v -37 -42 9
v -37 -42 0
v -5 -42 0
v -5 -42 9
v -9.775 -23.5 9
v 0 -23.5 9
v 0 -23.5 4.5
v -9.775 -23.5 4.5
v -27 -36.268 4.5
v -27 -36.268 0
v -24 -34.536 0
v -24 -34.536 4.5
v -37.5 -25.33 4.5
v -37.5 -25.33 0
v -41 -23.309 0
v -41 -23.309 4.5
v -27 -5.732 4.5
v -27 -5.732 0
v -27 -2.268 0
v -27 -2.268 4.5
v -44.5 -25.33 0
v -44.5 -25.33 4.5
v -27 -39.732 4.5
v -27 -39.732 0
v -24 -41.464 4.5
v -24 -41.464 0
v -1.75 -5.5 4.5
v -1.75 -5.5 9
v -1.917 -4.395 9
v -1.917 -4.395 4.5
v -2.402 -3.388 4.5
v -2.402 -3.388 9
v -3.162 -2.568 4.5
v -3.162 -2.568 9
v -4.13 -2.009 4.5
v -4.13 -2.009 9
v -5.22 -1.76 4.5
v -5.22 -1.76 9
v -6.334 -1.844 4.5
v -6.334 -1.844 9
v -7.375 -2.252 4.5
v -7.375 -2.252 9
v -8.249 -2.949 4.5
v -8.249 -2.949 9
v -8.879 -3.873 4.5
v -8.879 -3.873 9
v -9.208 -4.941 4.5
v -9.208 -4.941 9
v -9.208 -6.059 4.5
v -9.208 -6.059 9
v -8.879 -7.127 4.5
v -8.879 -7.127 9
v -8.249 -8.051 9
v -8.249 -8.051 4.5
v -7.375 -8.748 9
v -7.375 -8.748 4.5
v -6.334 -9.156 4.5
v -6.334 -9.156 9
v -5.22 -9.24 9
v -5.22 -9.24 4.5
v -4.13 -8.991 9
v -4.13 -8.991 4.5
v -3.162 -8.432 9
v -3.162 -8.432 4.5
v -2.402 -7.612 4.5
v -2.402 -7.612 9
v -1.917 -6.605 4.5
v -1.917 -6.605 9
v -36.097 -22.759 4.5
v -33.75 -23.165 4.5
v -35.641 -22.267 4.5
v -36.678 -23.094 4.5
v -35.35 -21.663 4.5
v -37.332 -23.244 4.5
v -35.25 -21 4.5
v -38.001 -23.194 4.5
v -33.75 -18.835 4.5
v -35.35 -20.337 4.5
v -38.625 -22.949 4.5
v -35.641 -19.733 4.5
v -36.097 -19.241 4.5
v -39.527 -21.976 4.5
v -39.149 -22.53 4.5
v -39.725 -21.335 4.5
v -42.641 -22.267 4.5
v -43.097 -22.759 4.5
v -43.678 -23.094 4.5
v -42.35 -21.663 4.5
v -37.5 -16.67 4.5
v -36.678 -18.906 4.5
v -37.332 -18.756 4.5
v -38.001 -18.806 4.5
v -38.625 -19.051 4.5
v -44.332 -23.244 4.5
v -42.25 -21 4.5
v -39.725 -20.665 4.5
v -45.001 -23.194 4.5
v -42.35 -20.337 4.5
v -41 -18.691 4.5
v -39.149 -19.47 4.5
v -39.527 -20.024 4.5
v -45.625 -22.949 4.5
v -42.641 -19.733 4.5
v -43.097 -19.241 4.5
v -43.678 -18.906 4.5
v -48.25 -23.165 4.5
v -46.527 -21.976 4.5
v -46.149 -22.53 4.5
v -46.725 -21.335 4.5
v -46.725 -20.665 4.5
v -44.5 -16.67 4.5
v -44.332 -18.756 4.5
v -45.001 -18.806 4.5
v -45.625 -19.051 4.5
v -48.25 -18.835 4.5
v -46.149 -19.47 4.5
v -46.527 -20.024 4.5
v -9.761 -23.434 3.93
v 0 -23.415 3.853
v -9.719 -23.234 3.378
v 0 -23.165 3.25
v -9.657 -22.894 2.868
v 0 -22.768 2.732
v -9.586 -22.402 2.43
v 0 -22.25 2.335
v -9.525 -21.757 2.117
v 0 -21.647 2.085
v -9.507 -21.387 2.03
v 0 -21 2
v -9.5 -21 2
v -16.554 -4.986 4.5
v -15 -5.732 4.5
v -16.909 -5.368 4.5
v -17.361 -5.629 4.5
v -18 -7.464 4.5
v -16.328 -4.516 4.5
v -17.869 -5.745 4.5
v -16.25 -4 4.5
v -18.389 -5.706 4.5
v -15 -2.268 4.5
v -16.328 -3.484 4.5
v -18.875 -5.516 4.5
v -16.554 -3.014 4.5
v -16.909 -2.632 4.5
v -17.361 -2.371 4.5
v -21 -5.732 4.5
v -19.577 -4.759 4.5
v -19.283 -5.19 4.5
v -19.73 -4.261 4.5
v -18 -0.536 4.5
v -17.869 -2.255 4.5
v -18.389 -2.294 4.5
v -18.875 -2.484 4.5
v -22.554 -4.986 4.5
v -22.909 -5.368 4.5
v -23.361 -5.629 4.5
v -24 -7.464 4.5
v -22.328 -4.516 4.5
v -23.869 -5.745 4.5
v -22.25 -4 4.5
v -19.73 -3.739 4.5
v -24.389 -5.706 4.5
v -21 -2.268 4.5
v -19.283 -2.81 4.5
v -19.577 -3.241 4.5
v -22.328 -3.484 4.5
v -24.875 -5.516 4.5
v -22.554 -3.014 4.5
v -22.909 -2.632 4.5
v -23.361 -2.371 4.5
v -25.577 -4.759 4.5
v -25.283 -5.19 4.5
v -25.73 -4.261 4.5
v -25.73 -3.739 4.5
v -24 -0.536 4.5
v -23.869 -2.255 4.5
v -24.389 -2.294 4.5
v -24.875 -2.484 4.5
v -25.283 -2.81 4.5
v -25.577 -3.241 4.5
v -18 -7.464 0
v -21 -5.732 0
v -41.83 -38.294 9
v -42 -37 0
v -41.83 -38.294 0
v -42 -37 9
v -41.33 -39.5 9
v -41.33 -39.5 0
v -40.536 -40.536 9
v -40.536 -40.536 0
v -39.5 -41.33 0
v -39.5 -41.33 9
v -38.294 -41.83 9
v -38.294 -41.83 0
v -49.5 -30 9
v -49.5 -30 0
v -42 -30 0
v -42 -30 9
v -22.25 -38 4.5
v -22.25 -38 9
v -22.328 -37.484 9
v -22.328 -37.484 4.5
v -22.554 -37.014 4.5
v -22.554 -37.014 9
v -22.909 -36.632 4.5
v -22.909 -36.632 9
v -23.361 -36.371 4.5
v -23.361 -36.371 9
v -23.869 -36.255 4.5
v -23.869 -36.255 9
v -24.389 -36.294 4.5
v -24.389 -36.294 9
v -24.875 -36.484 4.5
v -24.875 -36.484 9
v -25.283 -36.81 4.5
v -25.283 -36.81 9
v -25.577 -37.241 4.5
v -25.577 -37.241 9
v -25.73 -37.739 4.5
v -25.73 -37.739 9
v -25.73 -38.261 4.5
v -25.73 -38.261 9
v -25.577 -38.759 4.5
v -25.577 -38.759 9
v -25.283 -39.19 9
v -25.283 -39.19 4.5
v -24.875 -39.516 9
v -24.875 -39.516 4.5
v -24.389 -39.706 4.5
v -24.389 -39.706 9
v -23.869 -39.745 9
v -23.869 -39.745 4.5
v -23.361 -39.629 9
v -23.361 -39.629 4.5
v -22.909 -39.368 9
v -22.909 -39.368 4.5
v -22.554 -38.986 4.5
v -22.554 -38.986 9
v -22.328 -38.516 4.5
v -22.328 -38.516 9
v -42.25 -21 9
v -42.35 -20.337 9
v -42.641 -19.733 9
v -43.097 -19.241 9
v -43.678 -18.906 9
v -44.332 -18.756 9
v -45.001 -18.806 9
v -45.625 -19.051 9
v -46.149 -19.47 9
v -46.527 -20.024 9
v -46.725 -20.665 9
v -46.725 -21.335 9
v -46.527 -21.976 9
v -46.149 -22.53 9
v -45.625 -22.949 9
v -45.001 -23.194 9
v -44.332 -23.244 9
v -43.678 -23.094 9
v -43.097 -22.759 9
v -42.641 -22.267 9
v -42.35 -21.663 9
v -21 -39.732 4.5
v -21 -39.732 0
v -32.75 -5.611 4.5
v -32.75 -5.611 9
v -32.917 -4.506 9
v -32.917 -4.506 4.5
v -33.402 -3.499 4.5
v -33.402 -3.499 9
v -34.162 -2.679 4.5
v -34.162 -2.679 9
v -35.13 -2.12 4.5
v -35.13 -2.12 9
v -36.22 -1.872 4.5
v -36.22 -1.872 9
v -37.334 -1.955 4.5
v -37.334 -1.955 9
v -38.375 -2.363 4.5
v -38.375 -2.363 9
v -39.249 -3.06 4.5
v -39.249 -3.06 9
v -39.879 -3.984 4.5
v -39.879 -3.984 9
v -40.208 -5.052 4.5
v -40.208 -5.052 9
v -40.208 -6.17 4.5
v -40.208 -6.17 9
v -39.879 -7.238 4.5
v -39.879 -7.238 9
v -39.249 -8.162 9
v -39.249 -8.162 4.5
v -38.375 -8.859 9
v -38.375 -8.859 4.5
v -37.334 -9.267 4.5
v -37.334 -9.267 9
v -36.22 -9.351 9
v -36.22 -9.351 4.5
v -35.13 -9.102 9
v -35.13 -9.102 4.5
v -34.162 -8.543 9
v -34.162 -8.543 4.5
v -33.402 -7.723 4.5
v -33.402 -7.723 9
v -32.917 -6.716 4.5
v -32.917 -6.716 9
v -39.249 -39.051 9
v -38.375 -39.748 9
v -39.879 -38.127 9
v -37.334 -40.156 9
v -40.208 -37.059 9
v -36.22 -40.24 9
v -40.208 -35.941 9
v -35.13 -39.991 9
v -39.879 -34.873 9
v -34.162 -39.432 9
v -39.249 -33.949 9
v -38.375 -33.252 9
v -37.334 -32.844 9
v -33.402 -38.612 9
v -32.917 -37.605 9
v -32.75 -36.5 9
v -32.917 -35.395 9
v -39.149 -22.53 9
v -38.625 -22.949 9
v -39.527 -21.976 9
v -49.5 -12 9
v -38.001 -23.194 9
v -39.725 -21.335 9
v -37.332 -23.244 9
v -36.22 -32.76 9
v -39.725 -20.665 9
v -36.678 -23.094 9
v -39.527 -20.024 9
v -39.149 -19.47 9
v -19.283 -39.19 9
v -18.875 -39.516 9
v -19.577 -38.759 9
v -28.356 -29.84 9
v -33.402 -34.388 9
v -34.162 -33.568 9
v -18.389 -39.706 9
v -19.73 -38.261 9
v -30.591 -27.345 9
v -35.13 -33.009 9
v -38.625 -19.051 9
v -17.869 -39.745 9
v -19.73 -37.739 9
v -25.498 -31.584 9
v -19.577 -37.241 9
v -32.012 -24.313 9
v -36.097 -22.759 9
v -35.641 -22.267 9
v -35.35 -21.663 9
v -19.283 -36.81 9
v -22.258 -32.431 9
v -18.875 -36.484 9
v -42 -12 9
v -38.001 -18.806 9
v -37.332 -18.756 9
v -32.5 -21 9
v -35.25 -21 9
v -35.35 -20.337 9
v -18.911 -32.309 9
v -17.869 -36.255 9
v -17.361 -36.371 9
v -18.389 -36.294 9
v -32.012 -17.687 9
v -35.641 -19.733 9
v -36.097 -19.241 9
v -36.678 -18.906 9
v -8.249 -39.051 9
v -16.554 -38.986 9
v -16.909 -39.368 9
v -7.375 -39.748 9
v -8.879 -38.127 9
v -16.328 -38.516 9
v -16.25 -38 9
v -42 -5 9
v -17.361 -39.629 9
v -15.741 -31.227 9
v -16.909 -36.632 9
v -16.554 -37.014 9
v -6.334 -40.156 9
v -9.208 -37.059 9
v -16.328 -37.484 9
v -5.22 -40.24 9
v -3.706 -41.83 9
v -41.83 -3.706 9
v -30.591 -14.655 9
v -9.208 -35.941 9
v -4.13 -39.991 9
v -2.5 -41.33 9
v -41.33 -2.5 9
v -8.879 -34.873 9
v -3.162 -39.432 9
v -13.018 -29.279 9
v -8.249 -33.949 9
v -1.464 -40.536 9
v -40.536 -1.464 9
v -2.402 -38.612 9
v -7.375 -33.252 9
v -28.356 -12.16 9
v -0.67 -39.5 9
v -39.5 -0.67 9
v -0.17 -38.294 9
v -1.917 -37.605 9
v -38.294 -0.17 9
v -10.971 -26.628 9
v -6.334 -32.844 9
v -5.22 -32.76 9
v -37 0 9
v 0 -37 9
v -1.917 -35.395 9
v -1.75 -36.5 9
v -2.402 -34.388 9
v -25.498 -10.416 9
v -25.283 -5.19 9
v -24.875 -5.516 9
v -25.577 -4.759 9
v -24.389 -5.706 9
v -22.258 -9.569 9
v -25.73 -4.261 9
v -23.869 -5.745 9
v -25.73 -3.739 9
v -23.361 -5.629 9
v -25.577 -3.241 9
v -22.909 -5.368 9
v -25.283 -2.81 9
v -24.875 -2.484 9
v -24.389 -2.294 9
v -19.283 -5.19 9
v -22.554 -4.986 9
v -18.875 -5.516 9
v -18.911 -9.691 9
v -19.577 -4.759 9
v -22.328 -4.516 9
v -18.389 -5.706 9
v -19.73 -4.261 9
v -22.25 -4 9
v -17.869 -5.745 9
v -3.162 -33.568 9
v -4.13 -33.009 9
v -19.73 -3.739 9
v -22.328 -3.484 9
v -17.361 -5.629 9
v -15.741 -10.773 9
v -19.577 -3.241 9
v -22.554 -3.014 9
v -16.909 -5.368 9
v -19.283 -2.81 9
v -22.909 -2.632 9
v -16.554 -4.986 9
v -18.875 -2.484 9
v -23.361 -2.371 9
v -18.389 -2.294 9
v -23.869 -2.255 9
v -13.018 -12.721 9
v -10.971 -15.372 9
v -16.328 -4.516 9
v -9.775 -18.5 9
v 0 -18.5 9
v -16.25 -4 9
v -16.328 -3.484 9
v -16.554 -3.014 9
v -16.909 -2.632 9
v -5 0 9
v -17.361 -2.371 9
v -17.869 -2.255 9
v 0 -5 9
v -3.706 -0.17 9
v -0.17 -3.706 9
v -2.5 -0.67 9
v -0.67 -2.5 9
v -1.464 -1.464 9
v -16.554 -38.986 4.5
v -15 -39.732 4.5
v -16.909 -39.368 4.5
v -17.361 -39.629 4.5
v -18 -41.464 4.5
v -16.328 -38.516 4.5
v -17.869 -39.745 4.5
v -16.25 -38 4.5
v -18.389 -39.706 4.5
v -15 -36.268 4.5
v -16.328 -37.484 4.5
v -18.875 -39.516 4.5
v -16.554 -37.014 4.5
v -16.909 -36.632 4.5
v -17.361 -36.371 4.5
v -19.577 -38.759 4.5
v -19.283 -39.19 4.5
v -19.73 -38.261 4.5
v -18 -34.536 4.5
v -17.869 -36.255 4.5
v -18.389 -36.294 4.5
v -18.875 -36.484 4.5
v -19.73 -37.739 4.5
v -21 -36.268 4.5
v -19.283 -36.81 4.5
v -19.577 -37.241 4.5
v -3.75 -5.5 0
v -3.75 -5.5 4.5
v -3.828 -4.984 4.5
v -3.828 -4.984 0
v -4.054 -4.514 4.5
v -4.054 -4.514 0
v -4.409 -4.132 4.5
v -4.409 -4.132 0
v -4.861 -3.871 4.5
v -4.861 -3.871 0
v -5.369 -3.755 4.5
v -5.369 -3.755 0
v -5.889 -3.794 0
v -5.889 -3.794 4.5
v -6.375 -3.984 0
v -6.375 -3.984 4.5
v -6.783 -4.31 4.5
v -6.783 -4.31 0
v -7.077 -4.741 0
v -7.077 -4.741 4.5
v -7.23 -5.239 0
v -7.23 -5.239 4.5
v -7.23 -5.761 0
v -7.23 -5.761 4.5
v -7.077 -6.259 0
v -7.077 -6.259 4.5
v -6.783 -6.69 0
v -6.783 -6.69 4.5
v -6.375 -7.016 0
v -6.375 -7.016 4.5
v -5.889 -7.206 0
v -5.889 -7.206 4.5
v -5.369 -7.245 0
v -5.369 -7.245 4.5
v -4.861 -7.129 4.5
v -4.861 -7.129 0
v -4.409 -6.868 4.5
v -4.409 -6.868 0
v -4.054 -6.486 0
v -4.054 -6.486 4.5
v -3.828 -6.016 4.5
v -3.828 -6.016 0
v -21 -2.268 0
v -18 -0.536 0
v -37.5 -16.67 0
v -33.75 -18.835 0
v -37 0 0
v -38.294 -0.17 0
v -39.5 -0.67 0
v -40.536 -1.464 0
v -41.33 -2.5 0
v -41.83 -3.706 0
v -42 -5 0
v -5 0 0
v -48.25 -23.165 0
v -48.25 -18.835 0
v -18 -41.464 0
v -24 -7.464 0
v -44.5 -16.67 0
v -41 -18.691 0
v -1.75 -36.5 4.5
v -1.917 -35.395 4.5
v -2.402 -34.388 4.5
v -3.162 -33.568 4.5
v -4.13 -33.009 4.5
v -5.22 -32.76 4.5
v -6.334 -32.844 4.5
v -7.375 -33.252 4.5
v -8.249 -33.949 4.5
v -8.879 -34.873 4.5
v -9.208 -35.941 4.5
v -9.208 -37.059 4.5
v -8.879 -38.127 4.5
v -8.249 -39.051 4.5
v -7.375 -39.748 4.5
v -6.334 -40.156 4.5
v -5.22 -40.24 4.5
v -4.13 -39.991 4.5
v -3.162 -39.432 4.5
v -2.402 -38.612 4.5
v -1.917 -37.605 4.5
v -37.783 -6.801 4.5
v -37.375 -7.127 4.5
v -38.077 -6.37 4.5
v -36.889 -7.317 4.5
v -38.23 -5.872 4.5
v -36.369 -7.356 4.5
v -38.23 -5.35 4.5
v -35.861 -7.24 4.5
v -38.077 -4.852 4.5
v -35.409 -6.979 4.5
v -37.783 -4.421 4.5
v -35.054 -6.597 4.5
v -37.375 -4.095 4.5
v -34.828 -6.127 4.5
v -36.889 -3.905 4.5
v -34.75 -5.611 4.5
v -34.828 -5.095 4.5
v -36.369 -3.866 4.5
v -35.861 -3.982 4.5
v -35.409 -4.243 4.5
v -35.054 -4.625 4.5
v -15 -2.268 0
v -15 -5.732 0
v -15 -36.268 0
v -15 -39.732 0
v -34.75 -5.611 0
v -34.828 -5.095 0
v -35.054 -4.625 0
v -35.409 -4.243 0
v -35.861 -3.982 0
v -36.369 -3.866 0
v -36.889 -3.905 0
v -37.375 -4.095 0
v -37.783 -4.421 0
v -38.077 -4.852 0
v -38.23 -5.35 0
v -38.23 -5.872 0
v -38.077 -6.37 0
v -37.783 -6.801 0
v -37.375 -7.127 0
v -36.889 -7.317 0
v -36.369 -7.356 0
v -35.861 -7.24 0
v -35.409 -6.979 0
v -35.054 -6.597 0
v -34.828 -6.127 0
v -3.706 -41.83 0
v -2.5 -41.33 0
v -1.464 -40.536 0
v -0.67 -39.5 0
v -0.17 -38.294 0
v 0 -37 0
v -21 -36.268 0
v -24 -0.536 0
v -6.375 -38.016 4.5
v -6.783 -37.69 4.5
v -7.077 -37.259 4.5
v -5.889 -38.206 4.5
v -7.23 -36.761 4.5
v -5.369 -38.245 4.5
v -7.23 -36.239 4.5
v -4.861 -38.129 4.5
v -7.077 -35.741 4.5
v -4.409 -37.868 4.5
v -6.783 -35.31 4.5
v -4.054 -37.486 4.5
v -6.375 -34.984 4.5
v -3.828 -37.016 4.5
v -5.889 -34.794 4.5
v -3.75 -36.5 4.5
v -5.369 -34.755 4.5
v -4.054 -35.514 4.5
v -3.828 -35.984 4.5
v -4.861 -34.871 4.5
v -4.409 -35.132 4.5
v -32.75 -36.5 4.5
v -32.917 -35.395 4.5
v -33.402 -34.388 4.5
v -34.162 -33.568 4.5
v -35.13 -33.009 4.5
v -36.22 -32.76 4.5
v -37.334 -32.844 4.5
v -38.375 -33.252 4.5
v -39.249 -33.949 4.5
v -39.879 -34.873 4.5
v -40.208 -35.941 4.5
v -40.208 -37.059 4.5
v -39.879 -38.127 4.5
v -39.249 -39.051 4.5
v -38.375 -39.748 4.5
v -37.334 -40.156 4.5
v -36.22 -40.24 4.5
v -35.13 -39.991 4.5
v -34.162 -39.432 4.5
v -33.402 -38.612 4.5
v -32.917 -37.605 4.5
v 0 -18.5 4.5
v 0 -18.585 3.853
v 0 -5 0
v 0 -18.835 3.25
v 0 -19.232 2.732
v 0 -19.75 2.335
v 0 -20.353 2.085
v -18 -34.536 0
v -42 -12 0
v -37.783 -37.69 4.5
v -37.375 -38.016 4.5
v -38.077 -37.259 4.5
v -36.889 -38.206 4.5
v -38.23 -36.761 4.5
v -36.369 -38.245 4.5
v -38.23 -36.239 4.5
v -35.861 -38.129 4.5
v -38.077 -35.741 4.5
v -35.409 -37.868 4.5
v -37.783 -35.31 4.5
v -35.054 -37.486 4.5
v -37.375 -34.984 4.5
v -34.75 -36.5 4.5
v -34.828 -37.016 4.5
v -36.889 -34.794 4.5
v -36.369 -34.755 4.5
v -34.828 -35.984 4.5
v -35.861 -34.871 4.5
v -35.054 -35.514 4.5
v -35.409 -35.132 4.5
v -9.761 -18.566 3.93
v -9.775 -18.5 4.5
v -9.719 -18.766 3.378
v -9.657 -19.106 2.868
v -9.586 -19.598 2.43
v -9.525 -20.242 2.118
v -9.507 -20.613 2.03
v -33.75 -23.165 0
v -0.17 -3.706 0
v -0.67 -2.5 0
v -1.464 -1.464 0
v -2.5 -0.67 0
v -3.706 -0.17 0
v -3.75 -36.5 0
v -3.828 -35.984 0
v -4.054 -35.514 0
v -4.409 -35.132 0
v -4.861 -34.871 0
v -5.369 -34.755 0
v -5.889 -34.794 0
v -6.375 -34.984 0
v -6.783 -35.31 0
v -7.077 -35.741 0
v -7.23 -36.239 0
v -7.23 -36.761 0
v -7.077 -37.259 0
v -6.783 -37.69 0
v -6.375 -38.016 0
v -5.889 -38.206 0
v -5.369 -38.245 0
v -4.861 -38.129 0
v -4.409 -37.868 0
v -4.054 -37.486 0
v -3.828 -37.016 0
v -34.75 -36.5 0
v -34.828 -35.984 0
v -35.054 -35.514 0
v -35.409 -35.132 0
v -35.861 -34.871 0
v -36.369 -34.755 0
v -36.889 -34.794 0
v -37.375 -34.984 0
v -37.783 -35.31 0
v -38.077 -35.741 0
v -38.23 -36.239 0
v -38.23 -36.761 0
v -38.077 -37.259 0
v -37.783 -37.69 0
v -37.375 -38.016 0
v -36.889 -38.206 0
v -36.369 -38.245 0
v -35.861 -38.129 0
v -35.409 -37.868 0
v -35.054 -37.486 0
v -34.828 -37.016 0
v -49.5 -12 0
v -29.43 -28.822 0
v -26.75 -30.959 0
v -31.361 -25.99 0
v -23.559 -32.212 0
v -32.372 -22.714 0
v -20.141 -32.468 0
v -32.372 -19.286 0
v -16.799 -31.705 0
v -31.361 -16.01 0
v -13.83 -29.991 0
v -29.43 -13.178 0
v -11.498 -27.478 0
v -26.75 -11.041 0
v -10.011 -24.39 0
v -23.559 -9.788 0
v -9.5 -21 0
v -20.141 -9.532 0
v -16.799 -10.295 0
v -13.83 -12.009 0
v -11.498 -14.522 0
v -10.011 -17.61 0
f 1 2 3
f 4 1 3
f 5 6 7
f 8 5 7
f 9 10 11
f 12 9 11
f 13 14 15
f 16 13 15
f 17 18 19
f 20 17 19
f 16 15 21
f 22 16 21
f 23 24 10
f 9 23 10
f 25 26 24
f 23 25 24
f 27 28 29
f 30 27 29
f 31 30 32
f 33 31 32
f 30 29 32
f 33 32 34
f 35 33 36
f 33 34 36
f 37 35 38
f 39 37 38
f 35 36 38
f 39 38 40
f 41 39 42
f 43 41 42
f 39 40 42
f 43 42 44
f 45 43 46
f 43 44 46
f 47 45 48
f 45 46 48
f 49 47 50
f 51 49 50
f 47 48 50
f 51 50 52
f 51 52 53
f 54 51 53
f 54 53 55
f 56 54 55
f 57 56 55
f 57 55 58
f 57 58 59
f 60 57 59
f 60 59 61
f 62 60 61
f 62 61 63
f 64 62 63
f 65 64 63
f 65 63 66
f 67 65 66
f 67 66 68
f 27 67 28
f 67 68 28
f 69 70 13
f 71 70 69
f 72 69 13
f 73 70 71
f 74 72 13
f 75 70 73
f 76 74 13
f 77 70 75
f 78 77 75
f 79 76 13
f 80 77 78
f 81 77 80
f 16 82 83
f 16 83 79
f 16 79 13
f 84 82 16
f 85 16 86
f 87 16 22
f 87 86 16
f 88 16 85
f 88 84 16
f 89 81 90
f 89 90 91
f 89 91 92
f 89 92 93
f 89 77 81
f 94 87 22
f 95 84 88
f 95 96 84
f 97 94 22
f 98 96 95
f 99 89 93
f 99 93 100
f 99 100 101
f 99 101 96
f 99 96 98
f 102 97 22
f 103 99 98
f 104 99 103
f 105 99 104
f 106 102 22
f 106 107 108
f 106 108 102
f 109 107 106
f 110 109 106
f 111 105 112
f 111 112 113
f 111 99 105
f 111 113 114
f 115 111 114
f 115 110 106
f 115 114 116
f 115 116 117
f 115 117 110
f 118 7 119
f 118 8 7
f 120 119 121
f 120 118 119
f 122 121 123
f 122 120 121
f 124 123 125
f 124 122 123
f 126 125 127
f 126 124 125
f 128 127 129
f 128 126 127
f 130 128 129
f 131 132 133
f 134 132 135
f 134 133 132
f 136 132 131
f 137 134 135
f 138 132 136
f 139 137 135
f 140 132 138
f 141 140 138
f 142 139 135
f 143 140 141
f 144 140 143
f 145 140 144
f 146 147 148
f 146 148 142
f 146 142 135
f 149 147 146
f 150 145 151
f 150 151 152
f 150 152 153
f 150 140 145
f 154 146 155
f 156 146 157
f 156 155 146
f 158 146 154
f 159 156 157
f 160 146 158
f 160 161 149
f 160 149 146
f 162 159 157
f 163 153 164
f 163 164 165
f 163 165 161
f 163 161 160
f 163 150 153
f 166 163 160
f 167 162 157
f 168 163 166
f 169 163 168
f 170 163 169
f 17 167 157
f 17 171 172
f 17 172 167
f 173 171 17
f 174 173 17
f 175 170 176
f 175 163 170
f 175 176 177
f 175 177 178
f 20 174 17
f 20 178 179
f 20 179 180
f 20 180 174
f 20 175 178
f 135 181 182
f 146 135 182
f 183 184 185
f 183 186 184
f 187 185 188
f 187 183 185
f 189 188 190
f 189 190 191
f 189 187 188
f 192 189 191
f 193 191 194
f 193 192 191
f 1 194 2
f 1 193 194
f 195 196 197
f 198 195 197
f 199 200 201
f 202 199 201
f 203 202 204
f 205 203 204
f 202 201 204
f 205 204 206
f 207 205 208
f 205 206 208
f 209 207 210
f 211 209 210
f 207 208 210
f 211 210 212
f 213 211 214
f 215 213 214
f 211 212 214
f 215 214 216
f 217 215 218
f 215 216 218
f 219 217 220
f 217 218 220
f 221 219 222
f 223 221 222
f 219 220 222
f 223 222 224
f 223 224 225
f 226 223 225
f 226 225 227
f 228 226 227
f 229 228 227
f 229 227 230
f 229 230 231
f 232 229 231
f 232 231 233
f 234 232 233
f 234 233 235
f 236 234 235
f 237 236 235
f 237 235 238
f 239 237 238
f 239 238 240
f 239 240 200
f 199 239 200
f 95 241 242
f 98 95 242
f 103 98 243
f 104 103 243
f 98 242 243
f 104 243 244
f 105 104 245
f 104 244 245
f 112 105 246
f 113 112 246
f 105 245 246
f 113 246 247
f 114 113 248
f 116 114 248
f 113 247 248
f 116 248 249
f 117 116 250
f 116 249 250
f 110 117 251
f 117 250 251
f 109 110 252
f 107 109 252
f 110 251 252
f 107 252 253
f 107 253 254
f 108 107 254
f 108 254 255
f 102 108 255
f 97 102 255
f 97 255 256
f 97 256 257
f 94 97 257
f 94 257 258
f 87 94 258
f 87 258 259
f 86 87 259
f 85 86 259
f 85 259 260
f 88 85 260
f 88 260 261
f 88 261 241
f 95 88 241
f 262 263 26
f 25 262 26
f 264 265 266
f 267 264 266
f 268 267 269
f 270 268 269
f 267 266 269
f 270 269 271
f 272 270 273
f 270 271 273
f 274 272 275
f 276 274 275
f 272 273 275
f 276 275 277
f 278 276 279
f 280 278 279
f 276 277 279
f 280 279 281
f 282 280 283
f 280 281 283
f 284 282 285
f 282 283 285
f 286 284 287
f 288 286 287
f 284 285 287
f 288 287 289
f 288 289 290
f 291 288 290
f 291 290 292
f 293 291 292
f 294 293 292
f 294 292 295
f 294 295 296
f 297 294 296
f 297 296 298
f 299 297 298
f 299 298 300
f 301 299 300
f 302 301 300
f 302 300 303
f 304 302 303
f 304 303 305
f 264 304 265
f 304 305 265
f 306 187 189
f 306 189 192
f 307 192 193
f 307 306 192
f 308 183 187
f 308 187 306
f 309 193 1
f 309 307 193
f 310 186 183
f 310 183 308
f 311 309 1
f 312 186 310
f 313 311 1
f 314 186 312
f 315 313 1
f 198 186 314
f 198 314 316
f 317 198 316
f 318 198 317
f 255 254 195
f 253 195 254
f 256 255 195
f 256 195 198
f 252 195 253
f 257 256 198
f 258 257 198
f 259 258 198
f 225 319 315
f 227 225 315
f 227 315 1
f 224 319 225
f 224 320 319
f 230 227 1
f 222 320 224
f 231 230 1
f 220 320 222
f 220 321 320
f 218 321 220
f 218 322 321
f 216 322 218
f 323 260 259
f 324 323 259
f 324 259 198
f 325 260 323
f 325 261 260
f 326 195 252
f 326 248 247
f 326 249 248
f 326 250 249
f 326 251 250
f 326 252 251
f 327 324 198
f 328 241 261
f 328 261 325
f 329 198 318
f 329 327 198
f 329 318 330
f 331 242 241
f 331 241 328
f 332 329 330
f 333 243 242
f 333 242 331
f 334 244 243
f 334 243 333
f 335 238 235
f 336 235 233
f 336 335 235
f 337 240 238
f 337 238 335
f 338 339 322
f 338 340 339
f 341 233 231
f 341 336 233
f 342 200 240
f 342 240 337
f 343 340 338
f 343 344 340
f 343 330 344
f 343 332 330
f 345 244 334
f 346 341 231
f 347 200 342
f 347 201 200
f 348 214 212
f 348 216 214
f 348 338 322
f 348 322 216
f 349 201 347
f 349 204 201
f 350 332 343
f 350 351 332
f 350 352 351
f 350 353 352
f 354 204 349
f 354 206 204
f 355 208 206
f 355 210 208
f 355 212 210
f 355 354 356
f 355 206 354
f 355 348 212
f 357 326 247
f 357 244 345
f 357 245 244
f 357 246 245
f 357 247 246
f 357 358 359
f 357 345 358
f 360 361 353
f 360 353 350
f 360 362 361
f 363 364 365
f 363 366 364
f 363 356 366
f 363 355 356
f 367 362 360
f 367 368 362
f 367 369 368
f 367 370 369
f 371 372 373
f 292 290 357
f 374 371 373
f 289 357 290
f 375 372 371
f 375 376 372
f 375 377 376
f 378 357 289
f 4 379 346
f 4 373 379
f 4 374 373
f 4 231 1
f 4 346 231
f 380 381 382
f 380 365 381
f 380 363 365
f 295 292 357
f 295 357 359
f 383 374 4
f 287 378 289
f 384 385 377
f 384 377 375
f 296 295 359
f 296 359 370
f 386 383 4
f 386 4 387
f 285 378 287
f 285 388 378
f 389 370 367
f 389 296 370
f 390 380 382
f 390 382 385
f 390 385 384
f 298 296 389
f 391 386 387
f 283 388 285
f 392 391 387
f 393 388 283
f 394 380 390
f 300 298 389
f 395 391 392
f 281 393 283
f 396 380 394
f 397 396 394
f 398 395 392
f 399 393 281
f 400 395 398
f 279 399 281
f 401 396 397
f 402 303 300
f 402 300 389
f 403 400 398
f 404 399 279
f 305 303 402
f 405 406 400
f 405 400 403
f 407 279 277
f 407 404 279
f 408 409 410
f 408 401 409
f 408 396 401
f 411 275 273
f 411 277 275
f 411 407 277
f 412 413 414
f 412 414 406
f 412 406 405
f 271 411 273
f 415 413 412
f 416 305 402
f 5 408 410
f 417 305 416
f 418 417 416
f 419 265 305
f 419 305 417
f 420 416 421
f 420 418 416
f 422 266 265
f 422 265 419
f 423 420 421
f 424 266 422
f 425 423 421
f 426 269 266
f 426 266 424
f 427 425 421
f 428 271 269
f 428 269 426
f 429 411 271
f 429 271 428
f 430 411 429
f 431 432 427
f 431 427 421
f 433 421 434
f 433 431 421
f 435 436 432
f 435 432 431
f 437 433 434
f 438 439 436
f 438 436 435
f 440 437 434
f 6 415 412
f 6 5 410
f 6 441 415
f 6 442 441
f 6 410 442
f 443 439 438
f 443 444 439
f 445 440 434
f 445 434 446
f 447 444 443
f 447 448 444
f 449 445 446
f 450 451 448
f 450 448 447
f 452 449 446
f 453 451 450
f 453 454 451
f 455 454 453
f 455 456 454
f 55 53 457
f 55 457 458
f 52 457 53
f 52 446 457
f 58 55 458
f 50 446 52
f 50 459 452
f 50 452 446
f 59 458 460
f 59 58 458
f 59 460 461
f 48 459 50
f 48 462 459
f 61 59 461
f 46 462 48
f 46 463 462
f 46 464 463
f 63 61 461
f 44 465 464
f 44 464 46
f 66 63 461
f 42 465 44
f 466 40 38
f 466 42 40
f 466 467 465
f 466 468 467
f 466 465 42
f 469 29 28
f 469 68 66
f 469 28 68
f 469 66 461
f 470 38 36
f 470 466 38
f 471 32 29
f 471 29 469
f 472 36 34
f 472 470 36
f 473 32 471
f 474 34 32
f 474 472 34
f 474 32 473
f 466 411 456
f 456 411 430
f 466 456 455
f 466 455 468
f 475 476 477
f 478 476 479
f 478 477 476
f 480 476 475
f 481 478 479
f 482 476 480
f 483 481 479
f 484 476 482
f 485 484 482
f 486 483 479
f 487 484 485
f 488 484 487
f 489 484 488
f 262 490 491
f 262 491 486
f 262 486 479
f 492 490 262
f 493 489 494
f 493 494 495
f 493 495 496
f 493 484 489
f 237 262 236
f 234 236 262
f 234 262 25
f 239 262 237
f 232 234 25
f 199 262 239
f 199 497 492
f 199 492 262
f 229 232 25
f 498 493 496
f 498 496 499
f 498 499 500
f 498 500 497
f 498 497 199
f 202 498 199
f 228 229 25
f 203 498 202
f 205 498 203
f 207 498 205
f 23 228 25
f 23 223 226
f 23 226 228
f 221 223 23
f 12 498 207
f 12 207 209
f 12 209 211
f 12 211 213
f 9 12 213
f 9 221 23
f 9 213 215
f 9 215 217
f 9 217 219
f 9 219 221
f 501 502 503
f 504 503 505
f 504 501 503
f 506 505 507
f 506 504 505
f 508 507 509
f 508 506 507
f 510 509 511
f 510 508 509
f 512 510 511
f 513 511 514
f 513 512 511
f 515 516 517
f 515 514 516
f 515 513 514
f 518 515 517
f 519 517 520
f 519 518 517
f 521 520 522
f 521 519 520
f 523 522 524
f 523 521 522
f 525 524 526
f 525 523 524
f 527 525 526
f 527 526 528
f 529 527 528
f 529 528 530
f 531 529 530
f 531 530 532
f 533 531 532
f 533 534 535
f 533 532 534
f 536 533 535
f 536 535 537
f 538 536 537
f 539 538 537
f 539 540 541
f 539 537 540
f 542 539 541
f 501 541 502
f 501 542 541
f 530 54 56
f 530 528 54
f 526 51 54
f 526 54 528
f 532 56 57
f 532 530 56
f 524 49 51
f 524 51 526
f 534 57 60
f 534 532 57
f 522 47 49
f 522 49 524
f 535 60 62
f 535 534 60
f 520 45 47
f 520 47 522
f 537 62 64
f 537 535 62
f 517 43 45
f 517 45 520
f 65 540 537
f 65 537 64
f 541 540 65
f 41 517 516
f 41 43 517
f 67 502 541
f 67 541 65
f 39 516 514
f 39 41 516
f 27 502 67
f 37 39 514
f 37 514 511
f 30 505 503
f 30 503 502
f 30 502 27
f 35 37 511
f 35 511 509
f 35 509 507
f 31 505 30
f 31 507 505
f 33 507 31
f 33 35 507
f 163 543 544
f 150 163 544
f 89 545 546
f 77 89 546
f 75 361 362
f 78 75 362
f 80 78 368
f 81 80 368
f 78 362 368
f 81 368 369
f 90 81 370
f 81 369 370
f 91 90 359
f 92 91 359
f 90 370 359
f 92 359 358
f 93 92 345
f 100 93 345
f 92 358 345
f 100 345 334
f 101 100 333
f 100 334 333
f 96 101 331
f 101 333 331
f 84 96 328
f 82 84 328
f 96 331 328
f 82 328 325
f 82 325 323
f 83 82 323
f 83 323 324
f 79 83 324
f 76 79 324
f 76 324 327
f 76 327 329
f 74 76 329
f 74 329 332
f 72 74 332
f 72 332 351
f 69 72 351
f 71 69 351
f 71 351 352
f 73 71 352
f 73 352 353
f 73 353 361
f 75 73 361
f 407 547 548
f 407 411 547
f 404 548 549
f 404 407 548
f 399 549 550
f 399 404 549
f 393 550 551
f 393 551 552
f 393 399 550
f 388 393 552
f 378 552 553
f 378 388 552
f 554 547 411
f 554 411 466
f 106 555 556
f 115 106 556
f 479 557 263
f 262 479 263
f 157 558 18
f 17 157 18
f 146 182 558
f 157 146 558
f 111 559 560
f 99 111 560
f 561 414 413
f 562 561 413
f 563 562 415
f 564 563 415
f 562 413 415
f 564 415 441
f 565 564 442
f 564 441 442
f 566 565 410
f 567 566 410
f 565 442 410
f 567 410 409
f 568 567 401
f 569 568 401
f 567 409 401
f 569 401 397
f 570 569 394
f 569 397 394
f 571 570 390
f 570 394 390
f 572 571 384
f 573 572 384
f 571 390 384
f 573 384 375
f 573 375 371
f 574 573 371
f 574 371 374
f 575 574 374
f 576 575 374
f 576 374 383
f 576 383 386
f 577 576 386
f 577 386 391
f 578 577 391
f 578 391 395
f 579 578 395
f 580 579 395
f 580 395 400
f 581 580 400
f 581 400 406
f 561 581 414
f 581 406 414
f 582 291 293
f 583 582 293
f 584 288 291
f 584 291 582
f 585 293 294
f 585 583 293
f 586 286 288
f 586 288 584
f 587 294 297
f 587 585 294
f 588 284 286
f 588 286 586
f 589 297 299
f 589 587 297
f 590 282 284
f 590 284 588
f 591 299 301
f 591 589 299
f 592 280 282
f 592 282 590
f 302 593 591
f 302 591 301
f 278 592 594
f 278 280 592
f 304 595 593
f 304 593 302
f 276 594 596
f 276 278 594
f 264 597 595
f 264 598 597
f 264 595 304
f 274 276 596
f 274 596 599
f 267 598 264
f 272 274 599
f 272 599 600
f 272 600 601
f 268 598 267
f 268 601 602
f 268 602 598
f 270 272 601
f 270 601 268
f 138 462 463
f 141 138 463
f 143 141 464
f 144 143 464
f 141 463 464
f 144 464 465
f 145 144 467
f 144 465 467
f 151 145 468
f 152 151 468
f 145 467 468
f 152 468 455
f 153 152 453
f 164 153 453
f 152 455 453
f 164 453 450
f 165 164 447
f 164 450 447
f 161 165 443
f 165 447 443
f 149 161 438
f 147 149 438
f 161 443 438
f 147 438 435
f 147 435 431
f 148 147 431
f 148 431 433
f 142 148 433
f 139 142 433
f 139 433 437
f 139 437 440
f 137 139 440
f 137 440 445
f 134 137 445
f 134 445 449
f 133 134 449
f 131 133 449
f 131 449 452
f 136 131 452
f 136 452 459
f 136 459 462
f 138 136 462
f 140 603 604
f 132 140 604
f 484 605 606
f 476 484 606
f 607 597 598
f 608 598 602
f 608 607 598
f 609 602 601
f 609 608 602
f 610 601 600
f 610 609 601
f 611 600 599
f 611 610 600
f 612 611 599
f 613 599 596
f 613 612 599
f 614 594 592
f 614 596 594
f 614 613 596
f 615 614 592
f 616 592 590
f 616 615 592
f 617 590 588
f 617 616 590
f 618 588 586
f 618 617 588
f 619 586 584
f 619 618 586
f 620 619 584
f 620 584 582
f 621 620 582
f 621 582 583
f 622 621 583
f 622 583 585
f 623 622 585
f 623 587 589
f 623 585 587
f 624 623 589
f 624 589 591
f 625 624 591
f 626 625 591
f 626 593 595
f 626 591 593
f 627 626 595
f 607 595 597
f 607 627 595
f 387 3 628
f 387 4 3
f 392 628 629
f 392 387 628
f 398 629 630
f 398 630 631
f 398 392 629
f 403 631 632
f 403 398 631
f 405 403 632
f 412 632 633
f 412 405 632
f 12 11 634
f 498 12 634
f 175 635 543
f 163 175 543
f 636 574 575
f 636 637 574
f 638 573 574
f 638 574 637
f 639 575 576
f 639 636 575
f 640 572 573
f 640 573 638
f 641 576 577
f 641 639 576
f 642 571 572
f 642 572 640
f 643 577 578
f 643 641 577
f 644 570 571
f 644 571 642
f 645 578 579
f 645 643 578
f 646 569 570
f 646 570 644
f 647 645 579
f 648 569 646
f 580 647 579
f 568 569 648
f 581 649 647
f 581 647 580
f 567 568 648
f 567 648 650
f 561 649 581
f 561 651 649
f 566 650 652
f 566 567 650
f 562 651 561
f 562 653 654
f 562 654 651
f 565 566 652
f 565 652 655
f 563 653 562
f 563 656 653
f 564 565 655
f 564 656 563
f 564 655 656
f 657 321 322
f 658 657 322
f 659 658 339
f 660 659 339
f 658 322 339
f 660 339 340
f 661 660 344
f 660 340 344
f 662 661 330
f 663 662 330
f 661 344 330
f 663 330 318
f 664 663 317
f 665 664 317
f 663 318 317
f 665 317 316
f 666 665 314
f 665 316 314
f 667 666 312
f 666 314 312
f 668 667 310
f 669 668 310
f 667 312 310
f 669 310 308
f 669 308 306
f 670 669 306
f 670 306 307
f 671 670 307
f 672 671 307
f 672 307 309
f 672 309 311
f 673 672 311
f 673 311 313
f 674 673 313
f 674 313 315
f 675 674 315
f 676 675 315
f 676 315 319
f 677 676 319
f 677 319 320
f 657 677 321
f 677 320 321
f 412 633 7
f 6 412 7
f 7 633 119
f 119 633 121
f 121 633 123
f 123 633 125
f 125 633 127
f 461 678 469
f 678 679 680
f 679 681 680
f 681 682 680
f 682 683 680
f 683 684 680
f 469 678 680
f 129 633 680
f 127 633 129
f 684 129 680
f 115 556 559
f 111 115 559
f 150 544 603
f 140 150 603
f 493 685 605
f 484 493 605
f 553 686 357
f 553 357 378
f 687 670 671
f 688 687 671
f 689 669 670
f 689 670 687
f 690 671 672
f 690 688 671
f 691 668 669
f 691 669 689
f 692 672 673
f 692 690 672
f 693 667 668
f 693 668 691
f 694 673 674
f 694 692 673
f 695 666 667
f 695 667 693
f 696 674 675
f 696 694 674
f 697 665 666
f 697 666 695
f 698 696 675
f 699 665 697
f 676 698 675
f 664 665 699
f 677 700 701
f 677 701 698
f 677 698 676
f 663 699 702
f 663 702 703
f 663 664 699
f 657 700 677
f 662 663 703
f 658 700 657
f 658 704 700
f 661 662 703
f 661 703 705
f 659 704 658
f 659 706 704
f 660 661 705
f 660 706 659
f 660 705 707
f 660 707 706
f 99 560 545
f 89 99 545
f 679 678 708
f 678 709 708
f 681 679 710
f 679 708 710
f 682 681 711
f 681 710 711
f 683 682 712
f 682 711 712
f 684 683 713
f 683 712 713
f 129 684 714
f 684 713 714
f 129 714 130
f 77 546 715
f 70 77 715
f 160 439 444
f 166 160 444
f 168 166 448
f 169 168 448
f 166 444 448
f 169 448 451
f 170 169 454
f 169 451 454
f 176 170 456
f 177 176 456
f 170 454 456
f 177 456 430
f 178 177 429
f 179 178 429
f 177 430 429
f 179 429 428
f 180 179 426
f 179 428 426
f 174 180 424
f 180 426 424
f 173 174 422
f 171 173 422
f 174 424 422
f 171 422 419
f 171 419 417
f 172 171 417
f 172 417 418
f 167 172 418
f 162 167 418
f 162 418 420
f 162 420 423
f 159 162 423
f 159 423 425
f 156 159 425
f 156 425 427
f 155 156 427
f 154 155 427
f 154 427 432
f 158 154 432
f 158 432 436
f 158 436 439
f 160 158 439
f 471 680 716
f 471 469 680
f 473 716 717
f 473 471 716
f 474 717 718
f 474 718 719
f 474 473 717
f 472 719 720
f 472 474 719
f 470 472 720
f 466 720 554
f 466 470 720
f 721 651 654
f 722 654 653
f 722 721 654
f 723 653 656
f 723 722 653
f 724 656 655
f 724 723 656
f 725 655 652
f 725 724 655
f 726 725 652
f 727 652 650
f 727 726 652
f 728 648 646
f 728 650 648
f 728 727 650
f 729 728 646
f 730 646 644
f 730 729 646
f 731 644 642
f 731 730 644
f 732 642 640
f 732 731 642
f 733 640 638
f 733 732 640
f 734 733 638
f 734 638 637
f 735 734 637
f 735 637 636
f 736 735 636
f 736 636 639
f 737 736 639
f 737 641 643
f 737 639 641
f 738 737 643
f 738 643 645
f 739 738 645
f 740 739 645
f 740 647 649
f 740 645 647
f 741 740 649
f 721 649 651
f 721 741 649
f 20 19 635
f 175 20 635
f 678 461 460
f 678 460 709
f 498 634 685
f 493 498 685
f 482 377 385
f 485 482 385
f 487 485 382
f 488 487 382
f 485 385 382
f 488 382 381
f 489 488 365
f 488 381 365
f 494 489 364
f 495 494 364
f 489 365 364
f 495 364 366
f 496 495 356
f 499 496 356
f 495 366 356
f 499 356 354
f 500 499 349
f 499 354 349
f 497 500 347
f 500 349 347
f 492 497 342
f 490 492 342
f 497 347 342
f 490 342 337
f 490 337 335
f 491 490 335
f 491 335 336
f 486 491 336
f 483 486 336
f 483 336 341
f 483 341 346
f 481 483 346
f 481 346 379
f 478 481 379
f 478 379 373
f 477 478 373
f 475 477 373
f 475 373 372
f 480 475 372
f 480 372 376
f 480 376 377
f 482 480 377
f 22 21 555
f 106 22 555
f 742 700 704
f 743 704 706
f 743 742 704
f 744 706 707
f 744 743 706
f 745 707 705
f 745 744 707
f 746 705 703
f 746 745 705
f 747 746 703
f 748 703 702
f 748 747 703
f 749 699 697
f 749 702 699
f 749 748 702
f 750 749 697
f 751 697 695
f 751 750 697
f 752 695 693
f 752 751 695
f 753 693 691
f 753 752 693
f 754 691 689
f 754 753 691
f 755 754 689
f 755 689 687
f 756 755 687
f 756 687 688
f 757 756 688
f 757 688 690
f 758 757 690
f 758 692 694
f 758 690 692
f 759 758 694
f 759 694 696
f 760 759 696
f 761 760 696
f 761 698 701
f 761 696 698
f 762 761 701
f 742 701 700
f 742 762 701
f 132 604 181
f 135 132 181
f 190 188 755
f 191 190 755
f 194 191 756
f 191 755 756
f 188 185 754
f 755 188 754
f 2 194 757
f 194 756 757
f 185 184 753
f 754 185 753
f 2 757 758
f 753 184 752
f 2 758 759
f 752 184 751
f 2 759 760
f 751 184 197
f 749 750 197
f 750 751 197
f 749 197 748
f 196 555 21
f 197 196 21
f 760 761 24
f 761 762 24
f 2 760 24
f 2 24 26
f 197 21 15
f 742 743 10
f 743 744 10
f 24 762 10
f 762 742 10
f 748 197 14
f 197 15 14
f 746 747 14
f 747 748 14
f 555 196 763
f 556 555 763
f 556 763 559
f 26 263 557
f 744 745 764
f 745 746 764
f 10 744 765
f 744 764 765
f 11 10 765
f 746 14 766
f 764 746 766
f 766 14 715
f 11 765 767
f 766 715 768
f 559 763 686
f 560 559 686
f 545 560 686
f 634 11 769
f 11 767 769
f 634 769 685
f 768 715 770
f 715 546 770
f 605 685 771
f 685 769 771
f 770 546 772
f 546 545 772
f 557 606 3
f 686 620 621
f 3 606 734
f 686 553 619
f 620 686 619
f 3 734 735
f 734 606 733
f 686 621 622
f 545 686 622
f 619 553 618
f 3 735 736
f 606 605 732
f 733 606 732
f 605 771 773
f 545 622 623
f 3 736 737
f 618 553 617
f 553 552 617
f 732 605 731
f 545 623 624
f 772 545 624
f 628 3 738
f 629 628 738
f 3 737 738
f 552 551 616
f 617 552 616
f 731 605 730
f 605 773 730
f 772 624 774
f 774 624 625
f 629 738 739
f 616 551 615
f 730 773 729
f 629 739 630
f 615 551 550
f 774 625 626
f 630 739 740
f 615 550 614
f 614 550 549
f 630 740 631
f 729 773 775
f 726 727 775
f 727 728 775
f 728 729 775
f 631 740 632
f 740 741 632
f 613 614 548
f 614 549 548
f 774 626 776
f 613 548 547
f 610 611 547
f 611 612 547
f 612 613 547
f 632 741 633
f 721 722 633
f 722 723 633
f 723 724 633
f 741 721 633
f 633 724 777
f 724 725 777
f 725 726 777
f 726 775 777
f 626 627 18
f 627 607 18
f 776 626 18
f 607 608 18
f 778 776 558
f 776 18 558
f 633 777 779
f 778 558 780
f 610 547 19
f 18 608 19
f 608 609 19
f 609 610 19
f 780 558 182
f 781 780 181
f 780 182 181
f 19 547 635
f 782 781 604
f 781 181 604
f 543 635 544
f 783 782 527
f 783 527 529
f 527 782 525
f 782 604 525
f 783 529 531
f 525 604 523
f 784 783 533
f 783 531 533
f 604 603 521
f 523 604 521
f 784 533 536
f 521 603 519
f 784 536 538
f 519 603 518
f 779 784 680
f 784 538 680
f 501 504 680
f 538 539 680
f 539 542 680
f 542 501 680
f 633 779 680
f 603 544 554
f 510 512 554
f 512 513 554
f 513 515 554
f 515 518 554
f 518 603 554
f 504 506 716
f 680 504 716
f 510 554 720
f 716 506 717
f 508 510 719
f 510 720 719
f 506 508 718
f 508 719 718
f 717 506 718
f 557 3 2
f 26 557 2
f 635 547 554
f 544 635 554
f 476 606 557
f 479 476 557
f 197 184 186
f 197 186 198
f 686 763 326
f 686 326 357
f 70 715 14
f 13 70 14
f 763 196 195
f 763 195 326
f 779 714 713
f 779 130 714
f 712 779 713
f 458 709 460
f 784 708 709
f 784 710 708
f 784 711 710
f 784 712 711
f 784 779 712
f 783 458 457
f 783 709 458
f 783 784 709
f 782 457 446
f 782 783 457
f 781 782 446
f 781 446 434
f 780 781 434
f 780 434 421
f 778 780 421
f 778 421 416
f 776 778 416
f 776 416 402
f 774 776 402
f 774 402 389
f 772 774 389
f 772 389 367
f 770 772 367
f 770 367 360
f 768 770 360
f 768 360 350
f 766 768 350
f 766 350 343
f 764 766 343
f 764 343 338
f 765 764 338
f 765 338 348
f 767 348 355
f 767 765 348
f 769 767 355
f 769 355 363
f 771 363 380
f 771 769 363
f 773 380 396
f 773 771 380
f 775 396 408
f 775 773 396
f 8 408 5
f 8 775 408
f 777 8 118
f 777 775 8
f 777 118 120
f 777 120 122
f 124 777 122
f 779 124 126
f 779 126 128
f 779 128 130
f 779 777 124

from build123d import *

# Parameters (mm, degrees)
ESQUISSE1_W             = 42
ESQUISSE1_H             = 42
ESQUISSE1_R             = 11.5
ESQUISSE1_R_2           = 1.75
ESQUISSE1_W_2           = 7.5
ESQUISSE1_H_2           = 18
BOSS_EXTRU_1_DEPTH      = 9
ESQUISSE9_R             = 2.25
ENL_V_MAT_EXTRU_2_DEPTH = 17
ENL_V_MAT_EXTRU_3_DEPTH = 4.5
ESQUISSE11_R            = 3.75
ENL_V_MAT_EXTRU_4_DEPTH = 4.5
CONG_1_R                = 5
ESQUISSE12_R            = 1.75
ENL_V_MAT_EXTRU_5_DEPTH = 10
ENL_V_MAT_EXTRU_8_DEPTH = 4.5
ESQUISSE15_W            = 7
ESQUISSE15_H            = 5
ENL_V_MAT_EXTRU_9_DEPTH = 10
CONG_2_R                = 2.5


with BuildPart() as part:
    # Esquisse1 → Boss.-Extru.1 (new body)
    # profile 1 of 2: a face of its own
    with BuildSketch(Plane.XY):
        with Locations((-21, -21)):
            Rectangle(ESQUISSE1_W, ESQUISSE1_H)
        with Locations((-21, -21)):
            Circle(ESQUISSE1_R, mode=Mode.SUBTRACT)
        with Locations((-36.5, -36.5)):
            Circle(ESQUISSE1_R_2, mode=Mode.SUBTRACT)
        with Locations((-5.5, -36.5)):
            Circle(ESQUISSE1_R_2, mode=Mode.SUBTRACT)
        with Locations((-5.5, -5.5)):
            Circle(ESQUISSE1_R_2, mode=Mode.SUBTRACT)
        with Locations((-36.5, -5.611040912)):
            Circle(ESQUISSE1_R_2, mode=Mode.SUBTRACT)
    # profile 2 of 2: a face of its own
    with BuildSketch(Plane.XY):
        with Locations((-45.75, -21)):
            Rectangle(ESQUISSE1_W_2, ESQUISSE1_H_2)
    extrude(amount=BOSS_EXTRU_1_DEPTH)

    # Esquisse9 → Enlèv. mat.-Extru.2 (cut)
    with BuildSketch(Plane.XY.offset(9)):
        with Locations((-44.5, -21)):
            Circle(ESQUISSE9_R)
        with Locations((-37.5, -21)):
            Circle(ESQUISSE9_R)
    extrude(amount=-ENL_V_MAT_EXTRU_2_DEPTH, mode=Mode.SUBTRACT)

    # Esquisse10 → Enlèv. mat.-Extru.3 (cut)
    with BuildSketch(Plane(origin=(0, 0, 0), x_dir=(-1, 0, 0), z_dir=(0, 0, -1))):
        Polygon((44.5, -25.330127019), (48.25, -23.165063509), (48.25, -18.834936491), (44.5, -16.669872981), (40.75, -18.834936491), (40.75, -23.165063509), align=None)
        Polygon((37.5, -25.330127019), (41.25, -23.165063509), (41.25, -18.834936491), (37.5, -16.669872981), (33.75, -18.834936491), (33.75, -23.165063509), align=None)
    extrude(amount=-ENL_V_MAT_EXTRU_3_DEPTH, mode=Mode.SUBTRACT)

    # Esquisse11 → Enlèv. mat.-Extru.4 (cut)
    with BuildSketch(Plane.XY.offset(9)):
        with Locations((-36.5, -5.611040912)):
            Circle(ESQUISSE11_R)
        with Locations((-5.5, -5.5)):
            Circle(ESQUISSE11_R)
        with Locations((-5.5, -36.5)):
            Circle(ESQUISSE11_R)
        with Locations((-36.5, -36.5)):
            Circle(ESQUISSE11_R)
    extrude(amount=-ENL_V_MAT_EXTRU_4_DEPTH, mode=Mode.SUBTRACT)

    # Congé1
    cong_1_edges = [part.edges().sort_by_distance(p)[0] for p in [
        (0, 0, 4.5),
        (0, -42, 4.5),
        (-42, -42, 4.5),
        (-42, 0, 4.5),
    ]]
    fillet(cong_1_edges, radius=CONG_1_R)

    # Esquisse12 → Enlèv. mat.-Extru.5 (cut)
    with BuildSketch(Plane.XY.offset(9)):
        with Locations((-24, -38)):
            Circle(ESQUISSE12_R)
        with Locations((-18, -38)):
            Circle(ESQUISSE12_R)
        with Locations((-24, -4)):
            Circle(ESQUISSE12_R)
        with Locations((-18, -4)):
            Circle(ESQUISSE12_R)
    extrude(amount=-ENL_V_MAT_EXTRU_5_DEPTH, mode=Mode.SUBTRACT)

    # Esquisse14 → Enlèv. mat.-Extru.8 (cut)
    with BuildSketch(Plane(origin=(0, 0, 0), x_dir=(-1, 0, 0), z_dir=(0, 0, -1))):
        Polygon((27, -39.732050808), (27, -36.267949192), (24, -34.535898385), (21, -36.267949192), (18, -34.535898385), (15, -36.267949192), (15, -39.732050808), (18, -41.464101615), (21, -39.732050808), (24, -41.464101615), align=None)
        Polygon((27, -5.732050808), (27, -2.267949192), (24, -0.535898385), (21, -2.267949192), (18, -0.535898385), (15, -2.267949192), (15, -5.732050808), (18, -7.464101615), (21, -5.732050808), (24, -7.464101615), align=None)
    extrude(amount=-ENL_V_MAT_EXTRU_8_DEPTH, mode=Mode.SUBTRACT)

    # Esquisse15 → Enlèv. mat.-Extru.9 (cut)
    with BuildSketch(Plane(origin=(0, 0, 0), x_dir=(0, 0, -1), z_dir=(1, 0, 0))):
        with Locations((-5.5, -21)):
            Rectangle(ESQUISSE15_W, ESQUISSE15_H)
    extrude(amount=-ENL_V_MAT_EXTRU_9_DEPTH, mode=Mode.SUBTRACT)

    # Congé2
    cong_2_edges = [part.edges().sort_by_distance(p)[0] for p in [
        (-4.88751392, -23.5, 2),
        (-4.88751392, -18.5, 2),
    ]]
    fillet(cong_2_edges, radius=CONG_2_R - 0.0001)  # a hair under: the kernel refuses the full size


solid = part.part
